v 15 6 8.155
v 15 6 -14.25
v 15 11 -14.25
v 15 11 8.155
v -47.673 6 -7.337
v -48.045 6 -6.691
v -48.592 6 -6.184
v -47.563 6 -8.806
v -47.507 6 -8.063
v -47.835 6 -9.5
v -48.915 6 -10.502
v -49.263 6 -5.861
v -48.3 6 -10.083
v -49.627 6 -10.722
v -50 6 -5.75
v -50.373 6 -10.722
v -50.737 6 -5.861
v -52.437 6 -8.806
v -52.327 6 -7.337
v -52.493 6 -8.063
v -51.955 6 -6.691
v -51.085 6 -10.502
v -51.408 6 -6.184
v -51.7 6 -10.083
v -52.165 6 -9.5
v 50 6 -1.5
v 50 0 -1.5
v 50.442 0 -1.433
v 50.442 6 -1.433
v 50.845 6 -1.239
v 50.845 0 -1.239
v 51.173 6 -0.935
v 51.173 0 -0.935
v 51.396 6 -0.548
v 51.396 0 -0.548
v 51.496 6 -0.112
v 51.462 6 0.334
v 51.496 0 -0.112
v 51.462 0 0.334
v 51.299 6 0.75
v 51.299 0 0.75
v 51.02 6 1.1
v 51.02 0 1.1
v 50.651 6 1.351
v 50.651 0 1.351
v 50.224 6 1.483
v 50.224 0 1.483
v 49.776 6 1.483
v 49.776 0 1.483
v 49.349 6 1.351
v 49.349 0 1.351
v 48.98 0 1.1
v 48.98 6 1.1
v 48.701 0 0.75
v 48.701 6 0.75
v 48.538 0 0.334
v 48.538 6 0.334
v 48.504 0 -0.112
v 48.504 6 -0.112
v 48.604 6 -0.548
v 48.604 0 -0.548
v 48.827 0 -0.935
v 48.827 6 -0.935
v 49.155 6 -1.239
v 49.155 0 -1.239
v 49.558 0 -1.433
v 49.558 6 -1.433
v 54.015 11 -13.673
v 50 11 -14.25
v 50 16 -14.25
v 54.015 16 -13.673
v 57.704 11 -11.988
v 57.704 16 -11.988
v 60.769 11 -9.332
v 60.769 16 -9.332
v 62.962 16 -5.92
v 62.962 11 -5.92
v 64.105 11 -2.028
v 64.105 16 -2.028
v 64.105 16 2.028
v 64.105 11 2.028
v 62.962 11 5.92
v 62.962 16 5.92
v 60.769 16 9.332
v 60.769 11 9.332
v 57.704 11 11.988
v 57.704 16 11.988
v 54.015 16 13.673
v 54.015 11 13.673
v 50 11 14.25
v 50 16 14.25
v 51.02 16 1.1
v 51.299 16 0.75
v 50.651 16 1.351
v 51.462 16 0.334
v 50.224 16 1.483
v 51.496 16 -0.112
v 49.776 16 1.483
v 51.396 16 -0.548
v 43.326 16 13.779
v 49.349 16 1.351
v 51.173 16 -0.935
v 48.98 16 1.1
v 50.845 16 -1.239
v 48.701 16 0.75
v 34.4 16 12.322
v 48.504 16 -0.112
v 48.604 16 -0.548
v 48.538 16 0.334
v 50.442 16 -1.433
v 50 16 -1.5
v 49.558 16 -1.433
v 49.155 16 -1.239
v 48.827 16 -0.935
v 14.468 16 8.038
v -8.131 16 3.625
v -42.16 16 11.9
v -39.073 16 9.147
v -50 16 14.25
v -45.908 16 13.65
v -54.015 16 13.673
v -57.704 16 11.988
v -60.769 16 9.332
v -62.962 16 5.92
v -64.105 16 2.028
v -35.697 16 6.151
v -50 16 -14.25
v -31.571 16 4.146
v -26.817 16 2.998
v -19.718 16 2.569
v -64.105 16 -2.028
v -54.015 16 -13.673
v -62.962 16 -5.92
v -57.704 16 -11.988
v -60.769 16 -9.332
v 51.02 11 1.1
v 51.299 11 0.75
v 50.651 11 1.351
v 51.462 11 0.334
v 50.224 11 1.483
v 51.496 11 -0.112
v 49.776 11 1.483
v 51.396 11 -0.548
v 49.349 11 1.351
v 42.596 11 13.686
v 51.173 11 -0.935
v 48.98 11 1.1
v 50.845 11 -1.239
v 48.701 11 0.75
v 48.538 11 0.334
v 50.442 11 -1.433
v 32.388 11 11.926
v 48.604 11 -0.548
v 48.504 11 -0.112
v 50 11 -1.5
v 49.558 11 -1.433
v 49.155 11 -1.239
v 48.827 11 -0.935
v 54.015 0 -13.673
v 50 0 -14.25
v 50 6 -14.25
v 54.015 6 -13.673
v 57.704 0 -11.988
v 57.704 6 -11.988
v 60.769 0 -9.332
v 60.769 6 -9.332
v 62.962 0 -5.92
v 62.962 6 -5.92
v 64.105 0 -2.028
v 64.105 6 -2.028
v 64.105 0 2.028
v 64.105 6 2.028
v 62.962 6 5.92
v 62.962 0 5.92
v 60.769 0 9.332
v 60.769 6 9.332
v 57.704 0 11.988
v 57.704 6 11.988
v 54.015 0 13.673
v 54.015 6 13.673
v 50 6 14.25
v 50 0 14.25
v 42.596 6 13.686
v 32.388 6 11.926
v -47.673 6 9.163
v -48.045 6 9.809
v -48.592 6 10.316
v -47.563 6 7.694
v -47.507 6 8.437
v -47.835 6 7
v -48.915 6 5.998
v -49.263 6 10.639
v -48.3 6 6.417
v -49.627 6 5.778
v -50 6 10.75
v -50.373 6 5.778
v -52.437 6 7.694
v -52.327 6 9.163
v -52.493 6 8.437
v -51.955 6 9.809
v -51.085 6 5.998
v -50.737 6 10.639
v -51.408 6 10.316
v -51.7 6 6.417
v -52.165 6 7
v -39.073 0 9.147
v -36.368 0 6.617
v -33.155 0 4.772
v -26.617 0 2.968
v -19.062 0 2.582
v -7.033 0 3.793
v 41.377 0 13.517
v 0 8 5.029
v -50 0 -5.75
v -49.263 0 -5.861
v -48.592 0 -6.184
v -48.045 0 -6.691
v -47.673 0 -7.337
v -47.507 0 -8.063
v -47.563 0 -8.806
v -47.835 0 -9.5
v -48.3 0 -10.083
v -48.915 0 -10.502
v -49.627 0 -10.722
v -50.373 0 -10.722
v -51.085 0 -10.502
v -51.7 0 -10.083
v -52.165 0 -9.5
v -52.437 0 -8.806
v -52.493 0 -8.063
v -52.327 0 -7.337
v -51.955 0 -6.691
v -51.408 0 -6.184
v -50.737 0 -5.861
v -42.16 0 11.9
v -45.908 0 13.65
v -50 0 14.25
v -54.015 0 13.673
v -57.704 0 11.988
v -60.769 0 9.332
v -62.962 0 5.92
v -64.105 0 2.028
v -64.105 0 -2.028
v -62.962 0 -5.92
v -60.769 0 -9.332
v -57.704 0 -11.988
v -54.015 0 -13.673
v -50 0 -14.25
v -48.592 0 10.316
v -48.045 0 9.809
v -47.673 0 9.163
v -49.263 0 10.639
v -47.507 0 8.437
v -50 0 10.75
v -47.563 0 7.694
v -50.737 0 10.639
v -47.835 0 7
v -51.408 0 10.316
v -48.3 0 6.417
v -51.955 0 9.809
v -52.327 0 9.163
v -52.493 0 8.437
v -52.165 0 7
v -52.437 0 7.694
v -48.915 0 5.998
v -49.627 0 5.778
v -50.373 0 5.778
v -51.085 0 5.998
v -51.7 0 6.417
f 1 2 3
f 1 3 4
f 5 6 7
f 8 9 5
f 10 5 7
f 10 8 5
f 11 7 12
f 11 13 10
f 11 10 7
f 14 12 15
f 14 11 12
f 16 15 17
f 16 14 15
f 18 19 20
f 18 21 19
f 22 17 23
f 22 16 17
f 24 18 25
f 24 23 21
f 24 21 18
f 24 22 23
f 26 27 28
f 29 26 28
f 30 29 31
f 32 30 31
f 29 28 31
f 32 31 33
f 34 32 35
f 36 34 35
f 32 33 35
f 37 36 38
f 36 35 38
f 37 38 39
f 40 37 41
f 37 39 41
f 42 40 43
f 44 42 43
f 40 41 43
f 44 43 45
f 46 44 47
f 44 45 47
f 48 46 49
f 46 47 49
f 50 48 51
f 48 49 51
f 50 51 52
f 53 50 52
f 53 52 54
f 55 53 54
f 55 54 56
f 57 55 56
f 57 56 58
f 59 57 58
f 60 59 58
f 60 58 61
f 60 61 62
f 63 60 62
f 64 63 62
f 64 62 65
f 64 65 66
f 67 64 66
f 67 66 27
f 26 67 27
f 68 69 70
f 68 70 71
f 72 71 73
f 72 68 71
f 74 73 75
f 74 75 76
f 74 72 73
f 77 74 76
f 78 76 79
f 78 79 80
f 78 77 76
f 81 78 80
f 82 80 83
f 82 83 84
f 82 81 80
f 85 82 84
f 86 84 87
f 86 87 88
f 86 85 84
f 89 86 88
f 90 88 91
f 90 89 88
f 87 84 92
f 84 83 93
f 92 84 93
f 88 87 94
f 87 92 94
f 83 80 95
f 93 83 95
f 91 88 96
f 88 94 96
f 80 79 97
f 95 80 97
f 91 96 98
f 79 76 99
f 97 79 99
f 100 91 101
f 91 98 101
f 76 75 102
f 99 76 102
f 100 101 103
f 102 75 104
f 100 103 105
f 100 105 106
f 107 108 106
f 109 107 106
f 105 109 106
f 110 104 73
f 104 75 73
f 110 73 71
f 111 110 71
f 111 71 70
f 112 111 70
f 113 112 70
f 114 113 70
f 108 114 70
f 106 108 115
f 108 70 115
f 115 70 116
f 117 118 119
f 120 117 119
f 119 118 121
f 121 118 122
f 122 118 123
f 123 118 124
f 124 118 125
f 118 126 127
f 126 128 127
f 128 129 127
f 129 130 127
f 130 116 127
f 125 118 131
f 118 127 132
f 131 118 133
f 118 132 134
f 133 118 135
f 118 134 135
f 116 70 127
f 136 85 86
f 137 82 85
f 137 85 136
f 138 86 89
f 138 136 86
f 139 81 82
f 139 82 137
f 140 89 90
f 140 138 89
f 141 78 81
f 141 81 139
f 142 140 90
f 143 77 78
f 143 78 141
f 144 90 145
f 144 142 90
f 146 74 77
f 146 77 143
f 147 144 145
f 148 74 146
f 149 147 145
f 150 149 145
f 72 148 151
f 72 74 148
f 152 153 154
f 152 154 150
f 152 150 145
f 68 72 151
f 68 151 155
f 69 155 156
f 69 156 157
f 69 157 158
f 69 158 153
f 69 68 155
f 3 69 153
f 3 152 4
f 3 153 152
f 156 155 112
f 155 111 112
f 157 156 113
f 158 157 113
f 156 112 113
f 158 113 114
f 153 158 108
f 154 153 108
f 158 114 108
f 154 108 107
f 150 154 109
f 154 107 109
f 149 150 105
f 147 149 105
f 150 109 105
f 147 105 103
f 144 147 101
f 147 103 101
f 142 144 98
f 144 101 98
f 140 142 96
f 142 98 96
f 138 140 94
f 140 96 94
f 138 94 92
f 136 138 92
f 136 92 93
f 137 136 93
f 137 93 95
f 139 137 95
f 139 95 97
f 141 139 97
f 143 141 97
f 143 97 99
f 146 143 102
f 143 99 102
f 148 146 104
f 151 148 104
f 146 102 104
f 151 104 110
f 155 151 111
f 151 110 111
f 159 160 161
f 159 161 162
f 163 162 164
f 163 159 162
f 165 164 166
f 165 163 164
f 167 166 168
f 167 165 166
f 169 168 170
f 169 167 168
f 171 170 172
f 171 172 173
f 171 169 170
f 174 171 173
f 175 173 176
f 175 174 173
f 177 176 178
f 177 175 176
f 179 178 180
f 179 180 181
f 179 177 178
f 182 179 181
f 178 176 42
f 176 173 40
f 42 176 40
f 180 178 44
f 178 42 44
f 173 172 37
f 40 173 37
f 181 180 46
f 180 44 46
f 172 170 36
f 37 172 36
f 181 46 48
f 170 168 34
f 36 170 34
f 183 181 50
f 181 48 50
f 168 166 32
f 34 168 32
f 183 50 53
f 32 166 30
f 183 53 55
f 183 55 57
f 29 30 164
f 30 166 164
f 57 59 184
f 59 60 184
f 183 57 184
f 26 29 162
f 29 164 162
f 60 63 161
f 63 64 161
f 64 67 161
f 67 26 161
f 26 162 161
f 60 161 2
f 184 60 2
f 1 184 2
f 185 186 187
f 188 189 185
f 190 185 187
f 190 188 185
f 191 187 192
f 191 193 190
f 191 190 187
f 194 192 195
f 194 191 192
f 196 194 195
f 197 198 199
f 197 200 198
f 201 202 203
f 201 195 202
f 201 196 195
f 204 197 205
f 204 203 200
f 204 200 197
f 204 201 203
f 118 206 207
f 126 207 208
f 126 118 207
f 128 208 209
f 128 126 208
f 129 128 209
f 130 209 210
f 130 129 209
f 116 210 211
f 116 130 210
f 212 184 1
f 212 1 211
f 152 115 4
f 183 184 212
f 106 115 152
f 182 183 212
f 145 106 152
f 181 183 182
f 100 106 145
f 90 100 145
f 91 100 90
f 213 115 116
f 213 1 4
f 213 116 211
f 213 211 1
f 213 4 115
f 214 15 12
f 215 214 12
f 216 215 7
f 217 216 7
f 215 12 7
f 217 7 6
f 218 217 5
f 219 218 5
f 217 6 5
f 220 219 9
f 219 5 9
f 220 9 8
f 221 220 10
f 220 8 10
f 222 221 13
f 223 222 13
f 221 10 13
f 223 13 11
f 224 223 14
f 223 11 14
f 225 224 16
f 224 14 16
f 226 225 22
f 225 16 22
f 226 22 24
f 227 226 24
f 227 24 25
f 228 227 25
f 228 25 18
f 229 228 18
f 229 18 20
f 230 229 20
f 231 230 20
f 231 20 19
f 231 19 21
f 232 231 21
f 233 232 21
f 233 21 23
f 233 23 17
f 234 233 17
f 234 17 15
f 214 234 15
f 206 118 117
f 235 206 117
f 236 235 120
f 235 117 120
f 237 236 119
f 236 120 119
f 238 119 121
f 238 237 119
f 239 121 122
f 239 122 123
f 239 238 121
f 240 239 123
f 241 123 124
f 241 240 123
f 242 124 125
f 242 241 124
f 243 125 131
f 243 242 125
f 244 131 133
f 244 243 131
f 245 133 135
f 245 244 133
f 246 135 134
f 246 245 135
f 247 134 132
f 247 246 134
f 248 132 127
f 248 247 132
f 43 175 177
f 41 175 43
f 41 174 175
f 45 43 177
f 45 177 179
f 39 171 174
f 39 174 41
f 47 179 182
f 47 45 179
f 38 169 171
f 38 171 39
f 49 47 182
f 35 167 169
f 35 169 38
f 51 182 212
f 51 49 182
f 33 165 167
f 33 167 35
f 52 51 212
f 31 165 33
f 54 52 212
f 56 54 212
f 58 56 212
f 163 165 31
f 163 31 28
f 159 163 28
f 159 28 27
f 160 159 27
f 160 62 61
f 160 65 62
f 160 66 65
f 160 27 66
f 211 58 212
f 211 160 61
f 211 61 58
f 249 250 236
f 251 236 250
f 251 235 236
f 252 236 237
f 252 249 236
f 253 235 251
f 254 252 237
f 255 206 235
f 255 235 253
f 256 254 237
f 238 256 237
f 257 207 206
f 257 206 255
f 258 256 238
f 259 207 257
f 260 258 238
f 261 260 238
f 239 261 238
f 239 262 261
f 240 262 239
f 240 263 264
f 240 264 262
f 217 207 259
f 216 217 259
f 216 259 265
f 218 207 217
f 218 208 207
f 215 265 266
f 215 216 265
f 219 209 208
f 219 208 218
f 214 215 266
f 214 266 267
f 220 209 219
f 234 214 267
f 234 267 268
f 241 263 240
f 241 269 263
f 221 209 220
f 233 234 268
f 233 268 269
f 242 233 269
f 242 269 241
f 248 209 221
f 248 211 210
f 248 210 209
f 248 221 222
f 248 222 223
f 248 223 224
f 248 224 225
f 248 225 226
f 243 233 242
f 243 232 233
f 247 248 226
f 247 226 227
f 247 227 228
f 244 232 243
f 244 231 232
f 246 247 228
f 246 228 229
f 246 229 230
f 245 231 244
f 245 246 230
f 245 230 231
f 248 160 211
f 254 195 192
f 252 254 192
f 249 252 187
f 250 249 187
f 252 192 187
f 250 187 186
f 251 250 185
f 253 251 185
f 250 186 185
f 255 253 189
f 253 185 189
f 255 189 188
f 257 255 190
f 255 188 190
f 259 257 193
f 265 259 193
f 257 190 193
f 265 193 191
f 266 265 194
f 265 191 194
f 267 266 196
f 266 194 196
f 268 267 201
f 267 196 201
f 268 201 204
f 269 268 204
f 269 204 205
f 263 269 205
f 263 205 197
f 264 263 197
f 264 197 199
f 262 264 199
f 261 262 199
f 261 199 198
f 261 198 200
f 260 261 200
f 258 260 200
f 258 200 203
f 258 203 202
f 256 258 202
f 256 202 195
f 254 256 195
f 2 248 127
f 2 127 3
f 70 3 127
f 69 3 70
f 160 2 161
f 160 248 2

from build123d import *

# Parameters (mm, degrees)
BOSS_EXTRUDE1_DEPTH = 6
CUT_EXTRUDE1_REACH  = 68.084
SKETCH2_R           = 2.5
SKETCH3_R           = 1.5
CUT_EXTRUDE2_DEPTH  = 67.08422656
BOSS_EXTRUDE2_DEPTH = 5
BOSS_EXTRUDE3_DEPTH = 5
CUT_EXTRUDE3_REACH  = 69.728
SKETCH6_R           = 1.5
CUT_EXTRUDE4_REACH  = 69.728


with BuildPart() as part:
    # Sketch1 → Boss-Extrude1 (new body)
    with BuildSketch(Plane(origin=(0, 0, 0), x_dir=(1, 0, 0), z_dir=(0, 1, 0))):
        with BuildLine():
            Line((-50, 14.25), (50, 14.25))
            ThreePointArc((50, 14.25), (64.25, 0), (50, -14.25))
            Line((50, -14.25), (-50, -14.25))
            ThreePointArc((-50, -14.25), (-64.25, 0), (-50, 14.25))
        make_face()
    extrude(amount=BOSS_EXTRUDE1_DEPTH)

    # Sketch2 → Cut-Extrude1 (cut, up to next)
    with BuildSketch(Plane(origin=(0, 6, 0), x_dir=(1, 0, 0), z_dir=(0, 1, 0)), mode=Mode.PRIVATE) as cut_extrude1_sk1:
        with Locations(Location((-50, 8.25, 0), (0, 0, 270))):
            Circle(SKETCH2_R)
    cut_extrude1_tool1 = extrude(cut_extrude1_sk1.sketch, amount=-CUT_EXTRUDE1_REACH, mode=Mode.PRIVATE) & part.part
    # Sketch2 → Cut-Extrude1 (cut, up to next)
    with BuildSketch(Plane(origin=(0, 6, 0), x_dir=(1, 0, 0), z_dir=(0, 1, 0)), mode=Mode.PRIVATE) as cut_extrude1_sk2:
        with Locations(Location((-50, -8.25, 0), (0, 0, 270))):
            Circle(SKETCH2_R)
    cut_extrude1_tool2 = extrude(cut_extrude1_sk2.sketch, amount=-CUT_EXTRUDE1_REACH, mode=Mode.PRIVATE) & part.part
    add(cut_extrude1_tool1.solids().sort_by_distance((-50, 6, -8.25))[0], mode=Mode.SUBTRACT)
    add(cut_extrude1_tool2.solids().sort_by_distance((-50, 6, 8.25))[0], mode=Mode.SUBTRACT)

    # Sketch3 → Cut-Extrude2 (cut, through all)
    with BuildSketch(Plane.XZ):
        with Locations(Location((50, 0, 0), (0, 0, 270))):
            Circle(SKETCH3_R)
    extrude(amount=-CUT_EXTRUDE2_DEPTH, mode=Mode.SUBTRACT)

    # Sketch4 → Boss-Extrude2 (add)
    with BuildSketch(Plane(origin=(0, 6, 0), x_dir=(1, 0, 0), z_dir=(0, 1, 0))):
        with BuildLine():
            Line((-50, 14.25), (15, 14.25))
            Line((15, 14.25), (15, -14.25))
            Line((15, -14.25), (-50, -14.25))
            ThreePointArc((-50, -14.25), (-64.25, 0), (-50, 14.25))
        make_face()
    extrude(amount=BOSS_EXTRUDE2_DEPTH)

    # Sketch5 → Boss-Extrude3 (add)
    with BuildSketch(Plane(origin=(0, 11, 0), x_dir=(1, 0, 0), z_dir=(0, 1, 0))):
        with BuildLine():
            Line((-50, 14.25), (50, 14.25))
            ThreePointArc((50, 14.25), (64.25, 0), (50, -14.25))
            Line((50, -14.25), (-50, -14.25))
            ThreePointArc((-50, -14.25), (-64.25, 0), (-50, 14.25))
        make_face()
    extrude(amount=BOSS_EXTRUDE3_DEPTH)

    # Sketch6 → Cut-Extrude3 (cut, up to next)
    with BuildSketch(Plane(origin=(0, 16, 0), x_dir=(1, 0, 0), z_dir=(0, 1, 0)), mode=Mode.PRIVATE) as cut_extrude3_sk1:
        with Locations(Location((50, 0, 0), (0, 0, 90))):
            Circle(SKETCH6_R)
    cut_extrude3_tool1 = extrude(cut_extrude3_sk1.sketch, amount=-CUT_EXTRUDE3_REACH, mode=Mode.PRIVATE) & part.part
    add(cut_extrude3_tool1.solids().sort_by_distance((50, 16, 0))[0], mode=Mode.SUBTRACT)

    # Sketch7 → Cut-Extrude4 (cut, up to next)
    with BuildSketch(Plane(origin=(0, 16, 0), x_dir=(1, 0, 0), z_dir=(0, 1, 0)), mode=Mode.PRIVATE) as cut_extrude4_sk1:
        with BuildLine():
            ThreePointArc((-39.07315683, -9.146944754), (-43.970135273, -12.911360555), (-50, -14.25))
            Line((-50, -14.25), (50, -14.25))
            add(Edge.make_bspline(
                [(-39.07315683, -9.146944754), (-31.514094033, -0.116968526), (5.438655837, -4.645240543), (38.697514387, -14.25), (50, -14.25)],
                knots=[0, 0, 0, 0, 0.435907903, 1, 1, 1, 1], degree=3))
        make_face()
    cut_extrude4_tool1 = extrude(cut_extrude4_sk1.sketch, amount=-CUT_EXTRUDE4_REACH, mode=Mode.PRIVATE) & part.part
    add(cut_extrude4_tool1.solids().sort_by_distance((-8.590717, 16, 9.791359))[0], mode=Mode.SUBTRACT)


solid = part.part
